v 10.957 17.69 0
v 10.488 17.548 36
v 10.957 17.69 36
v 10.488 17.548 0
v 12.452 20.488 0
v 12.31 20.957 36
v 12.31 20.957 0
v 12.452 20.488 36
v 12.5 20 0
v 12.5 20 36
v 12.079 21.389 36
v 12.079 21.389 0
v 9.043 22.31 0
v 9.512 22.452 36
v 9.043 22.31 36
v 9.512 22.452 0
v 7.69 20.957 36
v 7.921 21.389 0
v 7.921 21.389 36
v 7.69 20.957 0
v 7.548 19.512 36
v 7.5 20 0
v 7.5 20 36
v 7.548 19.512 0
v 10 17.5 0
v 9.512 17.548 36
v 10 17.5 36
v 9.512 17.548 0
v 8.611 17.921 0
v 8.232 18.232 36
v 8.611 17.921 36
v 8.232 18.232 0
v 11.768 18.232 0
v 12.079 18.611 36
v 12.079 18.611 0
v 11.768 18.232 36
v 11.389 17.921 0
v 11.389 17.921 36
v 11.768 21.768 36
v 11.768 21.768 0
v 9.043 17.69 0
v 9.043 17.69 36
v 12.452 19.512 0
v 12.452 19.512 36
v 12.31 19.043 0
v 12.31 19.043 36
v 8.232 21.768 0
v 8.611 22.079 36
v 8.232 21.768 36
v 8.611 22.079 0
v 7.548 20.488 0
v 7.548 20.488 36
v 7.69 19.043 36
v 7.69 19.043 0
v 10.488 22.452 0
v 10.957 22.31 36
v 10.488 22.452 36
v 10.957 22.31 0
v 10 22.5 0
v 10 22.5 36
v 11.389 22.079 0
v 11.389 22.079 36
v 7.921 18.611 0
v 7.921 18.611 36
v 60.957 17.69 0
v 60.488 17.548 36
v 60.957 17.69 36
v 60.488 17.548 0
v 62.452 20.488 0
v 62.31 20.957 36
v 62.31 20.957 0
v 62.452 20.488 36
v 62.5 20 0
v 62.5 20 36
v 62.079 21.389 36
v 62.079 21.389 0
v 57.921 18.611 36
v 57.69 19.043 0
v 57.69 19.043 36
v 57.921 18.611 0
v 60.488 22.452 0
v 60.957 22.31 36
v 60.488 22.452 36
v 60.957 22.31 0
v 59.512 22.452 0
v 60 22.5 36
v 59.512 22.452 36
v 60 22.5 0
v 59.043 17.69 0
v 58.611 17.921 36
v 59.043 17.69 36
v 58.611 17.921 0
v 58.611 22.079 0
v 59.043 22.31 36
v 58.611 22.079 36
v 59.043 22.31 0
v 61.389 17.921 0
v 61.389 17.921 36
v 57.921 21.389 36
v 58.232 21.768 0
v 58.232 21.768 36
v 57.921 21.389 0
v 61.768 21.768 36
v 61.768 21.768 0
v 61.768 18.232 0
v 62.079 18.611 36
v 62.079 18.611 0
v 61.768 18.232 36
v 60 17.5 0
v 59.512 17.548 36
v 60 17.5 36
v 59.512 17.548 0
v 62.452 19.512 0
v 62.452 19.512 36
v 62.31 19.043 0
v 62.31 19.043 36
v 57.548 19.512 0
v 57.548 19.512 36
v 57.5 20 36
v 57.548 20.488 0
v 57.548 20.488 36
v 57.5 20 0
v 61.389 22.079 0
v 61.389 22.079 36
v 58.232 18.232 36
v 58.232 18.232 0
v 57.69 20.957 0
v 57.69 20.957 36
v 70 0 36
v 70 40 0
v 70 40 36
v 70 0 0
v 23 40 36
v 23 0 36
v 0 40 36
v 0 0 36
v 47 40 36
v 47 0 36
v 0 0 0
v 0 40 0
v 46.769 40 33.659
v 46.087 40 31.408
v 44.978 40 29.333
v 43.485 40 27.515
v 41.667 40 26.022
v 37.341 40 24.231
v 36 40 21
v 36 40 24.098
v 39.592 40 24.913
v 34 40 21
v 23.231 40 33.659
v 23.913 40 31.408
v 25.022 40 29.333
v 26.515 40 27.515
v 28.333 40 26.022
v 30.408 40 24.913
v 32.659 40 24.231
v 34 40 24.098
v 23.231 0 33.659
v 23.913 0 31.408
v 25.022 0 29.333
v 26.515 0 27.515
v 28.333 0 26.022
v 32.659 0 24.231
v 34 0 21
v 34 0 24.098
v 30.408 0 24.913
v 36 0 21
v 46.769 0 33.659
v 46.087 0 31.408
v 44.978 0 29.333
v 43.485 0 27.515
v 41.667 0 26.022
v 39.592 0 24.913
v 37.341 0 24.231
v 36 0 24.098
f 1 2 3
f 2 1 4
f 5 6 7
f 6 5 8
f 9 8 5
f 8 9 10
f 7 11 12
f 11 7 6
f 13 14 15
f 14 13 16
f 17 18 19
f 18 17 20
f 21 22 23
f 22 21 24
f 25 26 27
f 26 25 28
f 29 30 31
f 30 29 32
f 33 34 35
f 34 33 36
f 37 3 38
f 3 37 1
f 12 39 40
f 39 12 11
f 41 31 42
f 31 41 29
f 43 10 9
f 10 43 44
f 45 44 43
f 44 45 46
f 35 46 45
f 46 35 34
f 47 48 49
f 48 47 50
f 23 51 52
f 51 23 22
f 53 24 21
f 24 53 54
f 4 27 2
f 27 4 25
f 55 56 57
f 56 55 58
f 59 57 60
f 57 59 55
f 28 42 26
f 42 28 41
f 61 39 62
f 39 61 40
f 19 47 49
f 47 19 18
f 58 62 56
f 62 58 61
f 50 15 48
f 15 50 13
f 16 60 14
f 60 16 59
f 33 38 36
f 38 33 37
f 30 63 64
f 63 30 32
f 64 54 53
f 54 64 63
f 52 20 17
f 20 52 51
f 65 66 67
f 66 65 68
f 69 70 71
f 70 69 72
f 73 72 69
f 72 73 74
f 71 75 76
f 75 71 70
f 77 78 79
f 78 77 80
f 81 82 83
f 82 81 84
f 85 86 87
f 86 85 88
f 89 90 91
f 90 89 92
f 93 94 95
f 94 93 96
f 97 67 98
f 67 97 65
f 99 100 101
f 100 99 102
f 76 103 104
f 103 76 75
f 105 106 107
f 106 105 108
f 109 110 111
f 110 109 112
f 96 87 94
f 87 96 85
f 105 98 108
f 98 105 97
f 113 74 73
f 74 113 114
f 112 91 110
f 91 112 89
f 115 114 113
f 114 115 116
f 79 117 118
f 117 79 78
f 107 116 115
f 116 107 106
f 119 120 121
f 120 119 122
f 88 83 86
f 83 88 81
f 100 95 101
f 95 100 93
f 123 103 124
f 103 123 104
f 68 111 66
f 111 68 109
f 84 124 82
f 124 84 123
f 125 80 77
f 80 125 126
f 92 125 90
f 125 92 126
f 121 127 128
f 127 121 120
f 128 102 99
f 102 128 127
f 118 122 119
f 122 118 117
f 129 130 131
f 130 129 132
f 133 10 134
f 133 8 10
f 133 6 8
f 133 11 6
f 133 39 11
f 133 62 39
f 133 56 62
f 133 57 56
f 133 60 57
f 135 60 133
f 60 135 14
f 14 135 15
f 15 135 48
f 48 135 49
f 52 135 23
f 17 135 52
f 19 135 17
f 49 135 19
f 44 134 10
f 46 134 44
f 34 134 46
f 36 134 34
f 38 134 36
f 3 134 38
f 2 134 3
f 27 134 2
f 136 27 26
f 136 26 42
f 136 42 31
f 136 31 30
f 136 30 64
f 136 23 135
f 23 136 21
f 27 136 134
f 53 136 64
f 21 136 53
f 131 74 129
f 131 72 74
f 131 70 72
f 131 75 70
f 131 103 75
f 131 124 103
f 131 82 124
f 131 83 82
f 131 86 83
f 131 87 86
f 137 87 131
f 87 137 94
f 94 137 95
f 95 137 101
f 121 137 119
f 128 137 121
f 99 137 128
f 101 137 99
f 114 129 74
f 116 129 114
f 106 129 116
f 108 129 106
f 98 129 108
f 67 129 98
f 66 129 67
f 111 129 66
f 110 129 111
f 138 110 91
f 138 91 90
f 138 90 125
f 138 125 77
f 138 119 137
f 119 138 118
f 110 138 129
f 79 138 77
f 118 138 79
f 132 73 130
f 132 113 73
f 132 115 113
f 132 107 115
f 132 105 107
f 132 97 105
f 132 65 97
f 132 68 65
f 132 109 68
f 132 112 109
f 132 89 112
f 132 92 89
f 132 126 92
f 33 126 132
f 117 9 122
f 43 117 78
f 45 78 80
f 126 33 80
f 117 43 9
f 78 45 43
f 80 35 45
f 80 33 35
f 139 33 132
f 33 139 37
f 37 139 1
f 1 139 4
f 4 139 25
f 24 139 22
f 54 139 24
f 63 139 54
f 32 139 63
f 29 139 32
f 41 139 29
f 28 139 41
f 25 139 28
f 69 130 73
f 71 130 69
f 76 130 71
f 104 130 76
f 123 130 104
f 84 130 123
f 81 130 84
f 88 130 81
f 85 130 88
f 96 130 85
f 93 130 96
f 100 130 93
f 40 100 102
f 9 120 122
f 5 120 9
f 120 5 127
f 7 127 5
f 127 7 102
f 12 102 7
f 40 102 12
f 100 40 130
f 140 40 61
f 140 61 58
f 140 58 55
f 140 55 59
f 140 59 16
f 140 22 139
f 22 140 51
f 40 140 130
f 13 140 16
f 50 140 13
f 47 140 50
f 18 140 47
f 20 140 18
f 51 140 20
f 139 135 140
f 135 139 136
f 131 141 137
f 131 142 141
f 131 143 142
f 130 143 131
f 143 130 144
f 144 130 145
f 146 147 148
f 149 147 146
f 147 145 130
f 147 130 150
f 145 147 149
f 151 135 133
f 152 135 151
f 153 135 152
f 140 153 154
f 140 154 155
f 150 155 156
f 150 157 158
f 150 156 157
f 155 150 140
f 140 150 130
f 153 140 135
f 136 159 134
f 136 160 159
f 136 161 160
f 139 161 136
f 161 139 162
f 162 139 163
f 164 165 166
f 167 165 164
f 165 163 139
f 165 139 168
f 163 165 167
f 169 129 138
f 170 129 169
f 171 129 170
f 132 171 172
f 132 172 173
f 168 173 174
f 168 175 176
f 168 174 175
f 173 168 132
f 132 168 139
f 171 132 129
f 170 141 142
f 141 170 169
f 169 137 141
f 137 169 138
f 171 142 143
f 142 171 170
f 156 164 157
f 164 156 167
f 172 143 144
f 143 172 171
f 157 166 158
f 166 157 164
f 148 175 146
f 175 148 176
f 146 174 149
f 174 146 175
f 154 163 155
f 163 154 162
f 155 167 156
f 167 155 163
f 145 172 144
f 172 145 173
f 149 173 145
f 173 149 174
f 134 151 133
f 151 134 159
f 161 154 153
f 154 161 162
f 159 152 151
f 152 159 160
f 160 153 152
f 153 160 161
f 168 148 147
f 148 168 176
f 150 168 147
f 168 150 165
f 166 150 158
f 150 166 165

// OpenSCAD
$fn = 32;

// ----------------------------------------------------------------------
// Saddle clamp: split shaft clamp
// ----------------------------------------------------------------------

// --- parameters (mm) ---
blk_l = 70;               // block length, X
blk_w = 40;               // block width, Y
blk_h = 36;               // block height
clamp_r = 12;             // shaft groove radius
hole_r = 2.5;             // bolt hole radius
hole_m = 10;              // bolt hole margin from the ends
saw_w = 2;                // saw kerf width

saw_depth = clamp_r + 3;  // saw kerf depth

difference() {
  cube([blk_l, blk_w, blk_h]);
  translate([blk_l / 2, -1, blk_h])
    rotate([-90, 0, 0])
      cylinder(h = blk_w + 2, r = clamp_r);
  for (sx = [0, 1])
    translate([sx ? blk_l - hole_m : hole_m, blk_w / 2, -1])
      cylinder(r = hole_r, h = blk_h + 2);
  translate([blk_l / 2 - saw_w / 2, -1, blk_h - saw_depth])
    cube([saw_w, blk_w + 2, saw_depth + 1]);
}
